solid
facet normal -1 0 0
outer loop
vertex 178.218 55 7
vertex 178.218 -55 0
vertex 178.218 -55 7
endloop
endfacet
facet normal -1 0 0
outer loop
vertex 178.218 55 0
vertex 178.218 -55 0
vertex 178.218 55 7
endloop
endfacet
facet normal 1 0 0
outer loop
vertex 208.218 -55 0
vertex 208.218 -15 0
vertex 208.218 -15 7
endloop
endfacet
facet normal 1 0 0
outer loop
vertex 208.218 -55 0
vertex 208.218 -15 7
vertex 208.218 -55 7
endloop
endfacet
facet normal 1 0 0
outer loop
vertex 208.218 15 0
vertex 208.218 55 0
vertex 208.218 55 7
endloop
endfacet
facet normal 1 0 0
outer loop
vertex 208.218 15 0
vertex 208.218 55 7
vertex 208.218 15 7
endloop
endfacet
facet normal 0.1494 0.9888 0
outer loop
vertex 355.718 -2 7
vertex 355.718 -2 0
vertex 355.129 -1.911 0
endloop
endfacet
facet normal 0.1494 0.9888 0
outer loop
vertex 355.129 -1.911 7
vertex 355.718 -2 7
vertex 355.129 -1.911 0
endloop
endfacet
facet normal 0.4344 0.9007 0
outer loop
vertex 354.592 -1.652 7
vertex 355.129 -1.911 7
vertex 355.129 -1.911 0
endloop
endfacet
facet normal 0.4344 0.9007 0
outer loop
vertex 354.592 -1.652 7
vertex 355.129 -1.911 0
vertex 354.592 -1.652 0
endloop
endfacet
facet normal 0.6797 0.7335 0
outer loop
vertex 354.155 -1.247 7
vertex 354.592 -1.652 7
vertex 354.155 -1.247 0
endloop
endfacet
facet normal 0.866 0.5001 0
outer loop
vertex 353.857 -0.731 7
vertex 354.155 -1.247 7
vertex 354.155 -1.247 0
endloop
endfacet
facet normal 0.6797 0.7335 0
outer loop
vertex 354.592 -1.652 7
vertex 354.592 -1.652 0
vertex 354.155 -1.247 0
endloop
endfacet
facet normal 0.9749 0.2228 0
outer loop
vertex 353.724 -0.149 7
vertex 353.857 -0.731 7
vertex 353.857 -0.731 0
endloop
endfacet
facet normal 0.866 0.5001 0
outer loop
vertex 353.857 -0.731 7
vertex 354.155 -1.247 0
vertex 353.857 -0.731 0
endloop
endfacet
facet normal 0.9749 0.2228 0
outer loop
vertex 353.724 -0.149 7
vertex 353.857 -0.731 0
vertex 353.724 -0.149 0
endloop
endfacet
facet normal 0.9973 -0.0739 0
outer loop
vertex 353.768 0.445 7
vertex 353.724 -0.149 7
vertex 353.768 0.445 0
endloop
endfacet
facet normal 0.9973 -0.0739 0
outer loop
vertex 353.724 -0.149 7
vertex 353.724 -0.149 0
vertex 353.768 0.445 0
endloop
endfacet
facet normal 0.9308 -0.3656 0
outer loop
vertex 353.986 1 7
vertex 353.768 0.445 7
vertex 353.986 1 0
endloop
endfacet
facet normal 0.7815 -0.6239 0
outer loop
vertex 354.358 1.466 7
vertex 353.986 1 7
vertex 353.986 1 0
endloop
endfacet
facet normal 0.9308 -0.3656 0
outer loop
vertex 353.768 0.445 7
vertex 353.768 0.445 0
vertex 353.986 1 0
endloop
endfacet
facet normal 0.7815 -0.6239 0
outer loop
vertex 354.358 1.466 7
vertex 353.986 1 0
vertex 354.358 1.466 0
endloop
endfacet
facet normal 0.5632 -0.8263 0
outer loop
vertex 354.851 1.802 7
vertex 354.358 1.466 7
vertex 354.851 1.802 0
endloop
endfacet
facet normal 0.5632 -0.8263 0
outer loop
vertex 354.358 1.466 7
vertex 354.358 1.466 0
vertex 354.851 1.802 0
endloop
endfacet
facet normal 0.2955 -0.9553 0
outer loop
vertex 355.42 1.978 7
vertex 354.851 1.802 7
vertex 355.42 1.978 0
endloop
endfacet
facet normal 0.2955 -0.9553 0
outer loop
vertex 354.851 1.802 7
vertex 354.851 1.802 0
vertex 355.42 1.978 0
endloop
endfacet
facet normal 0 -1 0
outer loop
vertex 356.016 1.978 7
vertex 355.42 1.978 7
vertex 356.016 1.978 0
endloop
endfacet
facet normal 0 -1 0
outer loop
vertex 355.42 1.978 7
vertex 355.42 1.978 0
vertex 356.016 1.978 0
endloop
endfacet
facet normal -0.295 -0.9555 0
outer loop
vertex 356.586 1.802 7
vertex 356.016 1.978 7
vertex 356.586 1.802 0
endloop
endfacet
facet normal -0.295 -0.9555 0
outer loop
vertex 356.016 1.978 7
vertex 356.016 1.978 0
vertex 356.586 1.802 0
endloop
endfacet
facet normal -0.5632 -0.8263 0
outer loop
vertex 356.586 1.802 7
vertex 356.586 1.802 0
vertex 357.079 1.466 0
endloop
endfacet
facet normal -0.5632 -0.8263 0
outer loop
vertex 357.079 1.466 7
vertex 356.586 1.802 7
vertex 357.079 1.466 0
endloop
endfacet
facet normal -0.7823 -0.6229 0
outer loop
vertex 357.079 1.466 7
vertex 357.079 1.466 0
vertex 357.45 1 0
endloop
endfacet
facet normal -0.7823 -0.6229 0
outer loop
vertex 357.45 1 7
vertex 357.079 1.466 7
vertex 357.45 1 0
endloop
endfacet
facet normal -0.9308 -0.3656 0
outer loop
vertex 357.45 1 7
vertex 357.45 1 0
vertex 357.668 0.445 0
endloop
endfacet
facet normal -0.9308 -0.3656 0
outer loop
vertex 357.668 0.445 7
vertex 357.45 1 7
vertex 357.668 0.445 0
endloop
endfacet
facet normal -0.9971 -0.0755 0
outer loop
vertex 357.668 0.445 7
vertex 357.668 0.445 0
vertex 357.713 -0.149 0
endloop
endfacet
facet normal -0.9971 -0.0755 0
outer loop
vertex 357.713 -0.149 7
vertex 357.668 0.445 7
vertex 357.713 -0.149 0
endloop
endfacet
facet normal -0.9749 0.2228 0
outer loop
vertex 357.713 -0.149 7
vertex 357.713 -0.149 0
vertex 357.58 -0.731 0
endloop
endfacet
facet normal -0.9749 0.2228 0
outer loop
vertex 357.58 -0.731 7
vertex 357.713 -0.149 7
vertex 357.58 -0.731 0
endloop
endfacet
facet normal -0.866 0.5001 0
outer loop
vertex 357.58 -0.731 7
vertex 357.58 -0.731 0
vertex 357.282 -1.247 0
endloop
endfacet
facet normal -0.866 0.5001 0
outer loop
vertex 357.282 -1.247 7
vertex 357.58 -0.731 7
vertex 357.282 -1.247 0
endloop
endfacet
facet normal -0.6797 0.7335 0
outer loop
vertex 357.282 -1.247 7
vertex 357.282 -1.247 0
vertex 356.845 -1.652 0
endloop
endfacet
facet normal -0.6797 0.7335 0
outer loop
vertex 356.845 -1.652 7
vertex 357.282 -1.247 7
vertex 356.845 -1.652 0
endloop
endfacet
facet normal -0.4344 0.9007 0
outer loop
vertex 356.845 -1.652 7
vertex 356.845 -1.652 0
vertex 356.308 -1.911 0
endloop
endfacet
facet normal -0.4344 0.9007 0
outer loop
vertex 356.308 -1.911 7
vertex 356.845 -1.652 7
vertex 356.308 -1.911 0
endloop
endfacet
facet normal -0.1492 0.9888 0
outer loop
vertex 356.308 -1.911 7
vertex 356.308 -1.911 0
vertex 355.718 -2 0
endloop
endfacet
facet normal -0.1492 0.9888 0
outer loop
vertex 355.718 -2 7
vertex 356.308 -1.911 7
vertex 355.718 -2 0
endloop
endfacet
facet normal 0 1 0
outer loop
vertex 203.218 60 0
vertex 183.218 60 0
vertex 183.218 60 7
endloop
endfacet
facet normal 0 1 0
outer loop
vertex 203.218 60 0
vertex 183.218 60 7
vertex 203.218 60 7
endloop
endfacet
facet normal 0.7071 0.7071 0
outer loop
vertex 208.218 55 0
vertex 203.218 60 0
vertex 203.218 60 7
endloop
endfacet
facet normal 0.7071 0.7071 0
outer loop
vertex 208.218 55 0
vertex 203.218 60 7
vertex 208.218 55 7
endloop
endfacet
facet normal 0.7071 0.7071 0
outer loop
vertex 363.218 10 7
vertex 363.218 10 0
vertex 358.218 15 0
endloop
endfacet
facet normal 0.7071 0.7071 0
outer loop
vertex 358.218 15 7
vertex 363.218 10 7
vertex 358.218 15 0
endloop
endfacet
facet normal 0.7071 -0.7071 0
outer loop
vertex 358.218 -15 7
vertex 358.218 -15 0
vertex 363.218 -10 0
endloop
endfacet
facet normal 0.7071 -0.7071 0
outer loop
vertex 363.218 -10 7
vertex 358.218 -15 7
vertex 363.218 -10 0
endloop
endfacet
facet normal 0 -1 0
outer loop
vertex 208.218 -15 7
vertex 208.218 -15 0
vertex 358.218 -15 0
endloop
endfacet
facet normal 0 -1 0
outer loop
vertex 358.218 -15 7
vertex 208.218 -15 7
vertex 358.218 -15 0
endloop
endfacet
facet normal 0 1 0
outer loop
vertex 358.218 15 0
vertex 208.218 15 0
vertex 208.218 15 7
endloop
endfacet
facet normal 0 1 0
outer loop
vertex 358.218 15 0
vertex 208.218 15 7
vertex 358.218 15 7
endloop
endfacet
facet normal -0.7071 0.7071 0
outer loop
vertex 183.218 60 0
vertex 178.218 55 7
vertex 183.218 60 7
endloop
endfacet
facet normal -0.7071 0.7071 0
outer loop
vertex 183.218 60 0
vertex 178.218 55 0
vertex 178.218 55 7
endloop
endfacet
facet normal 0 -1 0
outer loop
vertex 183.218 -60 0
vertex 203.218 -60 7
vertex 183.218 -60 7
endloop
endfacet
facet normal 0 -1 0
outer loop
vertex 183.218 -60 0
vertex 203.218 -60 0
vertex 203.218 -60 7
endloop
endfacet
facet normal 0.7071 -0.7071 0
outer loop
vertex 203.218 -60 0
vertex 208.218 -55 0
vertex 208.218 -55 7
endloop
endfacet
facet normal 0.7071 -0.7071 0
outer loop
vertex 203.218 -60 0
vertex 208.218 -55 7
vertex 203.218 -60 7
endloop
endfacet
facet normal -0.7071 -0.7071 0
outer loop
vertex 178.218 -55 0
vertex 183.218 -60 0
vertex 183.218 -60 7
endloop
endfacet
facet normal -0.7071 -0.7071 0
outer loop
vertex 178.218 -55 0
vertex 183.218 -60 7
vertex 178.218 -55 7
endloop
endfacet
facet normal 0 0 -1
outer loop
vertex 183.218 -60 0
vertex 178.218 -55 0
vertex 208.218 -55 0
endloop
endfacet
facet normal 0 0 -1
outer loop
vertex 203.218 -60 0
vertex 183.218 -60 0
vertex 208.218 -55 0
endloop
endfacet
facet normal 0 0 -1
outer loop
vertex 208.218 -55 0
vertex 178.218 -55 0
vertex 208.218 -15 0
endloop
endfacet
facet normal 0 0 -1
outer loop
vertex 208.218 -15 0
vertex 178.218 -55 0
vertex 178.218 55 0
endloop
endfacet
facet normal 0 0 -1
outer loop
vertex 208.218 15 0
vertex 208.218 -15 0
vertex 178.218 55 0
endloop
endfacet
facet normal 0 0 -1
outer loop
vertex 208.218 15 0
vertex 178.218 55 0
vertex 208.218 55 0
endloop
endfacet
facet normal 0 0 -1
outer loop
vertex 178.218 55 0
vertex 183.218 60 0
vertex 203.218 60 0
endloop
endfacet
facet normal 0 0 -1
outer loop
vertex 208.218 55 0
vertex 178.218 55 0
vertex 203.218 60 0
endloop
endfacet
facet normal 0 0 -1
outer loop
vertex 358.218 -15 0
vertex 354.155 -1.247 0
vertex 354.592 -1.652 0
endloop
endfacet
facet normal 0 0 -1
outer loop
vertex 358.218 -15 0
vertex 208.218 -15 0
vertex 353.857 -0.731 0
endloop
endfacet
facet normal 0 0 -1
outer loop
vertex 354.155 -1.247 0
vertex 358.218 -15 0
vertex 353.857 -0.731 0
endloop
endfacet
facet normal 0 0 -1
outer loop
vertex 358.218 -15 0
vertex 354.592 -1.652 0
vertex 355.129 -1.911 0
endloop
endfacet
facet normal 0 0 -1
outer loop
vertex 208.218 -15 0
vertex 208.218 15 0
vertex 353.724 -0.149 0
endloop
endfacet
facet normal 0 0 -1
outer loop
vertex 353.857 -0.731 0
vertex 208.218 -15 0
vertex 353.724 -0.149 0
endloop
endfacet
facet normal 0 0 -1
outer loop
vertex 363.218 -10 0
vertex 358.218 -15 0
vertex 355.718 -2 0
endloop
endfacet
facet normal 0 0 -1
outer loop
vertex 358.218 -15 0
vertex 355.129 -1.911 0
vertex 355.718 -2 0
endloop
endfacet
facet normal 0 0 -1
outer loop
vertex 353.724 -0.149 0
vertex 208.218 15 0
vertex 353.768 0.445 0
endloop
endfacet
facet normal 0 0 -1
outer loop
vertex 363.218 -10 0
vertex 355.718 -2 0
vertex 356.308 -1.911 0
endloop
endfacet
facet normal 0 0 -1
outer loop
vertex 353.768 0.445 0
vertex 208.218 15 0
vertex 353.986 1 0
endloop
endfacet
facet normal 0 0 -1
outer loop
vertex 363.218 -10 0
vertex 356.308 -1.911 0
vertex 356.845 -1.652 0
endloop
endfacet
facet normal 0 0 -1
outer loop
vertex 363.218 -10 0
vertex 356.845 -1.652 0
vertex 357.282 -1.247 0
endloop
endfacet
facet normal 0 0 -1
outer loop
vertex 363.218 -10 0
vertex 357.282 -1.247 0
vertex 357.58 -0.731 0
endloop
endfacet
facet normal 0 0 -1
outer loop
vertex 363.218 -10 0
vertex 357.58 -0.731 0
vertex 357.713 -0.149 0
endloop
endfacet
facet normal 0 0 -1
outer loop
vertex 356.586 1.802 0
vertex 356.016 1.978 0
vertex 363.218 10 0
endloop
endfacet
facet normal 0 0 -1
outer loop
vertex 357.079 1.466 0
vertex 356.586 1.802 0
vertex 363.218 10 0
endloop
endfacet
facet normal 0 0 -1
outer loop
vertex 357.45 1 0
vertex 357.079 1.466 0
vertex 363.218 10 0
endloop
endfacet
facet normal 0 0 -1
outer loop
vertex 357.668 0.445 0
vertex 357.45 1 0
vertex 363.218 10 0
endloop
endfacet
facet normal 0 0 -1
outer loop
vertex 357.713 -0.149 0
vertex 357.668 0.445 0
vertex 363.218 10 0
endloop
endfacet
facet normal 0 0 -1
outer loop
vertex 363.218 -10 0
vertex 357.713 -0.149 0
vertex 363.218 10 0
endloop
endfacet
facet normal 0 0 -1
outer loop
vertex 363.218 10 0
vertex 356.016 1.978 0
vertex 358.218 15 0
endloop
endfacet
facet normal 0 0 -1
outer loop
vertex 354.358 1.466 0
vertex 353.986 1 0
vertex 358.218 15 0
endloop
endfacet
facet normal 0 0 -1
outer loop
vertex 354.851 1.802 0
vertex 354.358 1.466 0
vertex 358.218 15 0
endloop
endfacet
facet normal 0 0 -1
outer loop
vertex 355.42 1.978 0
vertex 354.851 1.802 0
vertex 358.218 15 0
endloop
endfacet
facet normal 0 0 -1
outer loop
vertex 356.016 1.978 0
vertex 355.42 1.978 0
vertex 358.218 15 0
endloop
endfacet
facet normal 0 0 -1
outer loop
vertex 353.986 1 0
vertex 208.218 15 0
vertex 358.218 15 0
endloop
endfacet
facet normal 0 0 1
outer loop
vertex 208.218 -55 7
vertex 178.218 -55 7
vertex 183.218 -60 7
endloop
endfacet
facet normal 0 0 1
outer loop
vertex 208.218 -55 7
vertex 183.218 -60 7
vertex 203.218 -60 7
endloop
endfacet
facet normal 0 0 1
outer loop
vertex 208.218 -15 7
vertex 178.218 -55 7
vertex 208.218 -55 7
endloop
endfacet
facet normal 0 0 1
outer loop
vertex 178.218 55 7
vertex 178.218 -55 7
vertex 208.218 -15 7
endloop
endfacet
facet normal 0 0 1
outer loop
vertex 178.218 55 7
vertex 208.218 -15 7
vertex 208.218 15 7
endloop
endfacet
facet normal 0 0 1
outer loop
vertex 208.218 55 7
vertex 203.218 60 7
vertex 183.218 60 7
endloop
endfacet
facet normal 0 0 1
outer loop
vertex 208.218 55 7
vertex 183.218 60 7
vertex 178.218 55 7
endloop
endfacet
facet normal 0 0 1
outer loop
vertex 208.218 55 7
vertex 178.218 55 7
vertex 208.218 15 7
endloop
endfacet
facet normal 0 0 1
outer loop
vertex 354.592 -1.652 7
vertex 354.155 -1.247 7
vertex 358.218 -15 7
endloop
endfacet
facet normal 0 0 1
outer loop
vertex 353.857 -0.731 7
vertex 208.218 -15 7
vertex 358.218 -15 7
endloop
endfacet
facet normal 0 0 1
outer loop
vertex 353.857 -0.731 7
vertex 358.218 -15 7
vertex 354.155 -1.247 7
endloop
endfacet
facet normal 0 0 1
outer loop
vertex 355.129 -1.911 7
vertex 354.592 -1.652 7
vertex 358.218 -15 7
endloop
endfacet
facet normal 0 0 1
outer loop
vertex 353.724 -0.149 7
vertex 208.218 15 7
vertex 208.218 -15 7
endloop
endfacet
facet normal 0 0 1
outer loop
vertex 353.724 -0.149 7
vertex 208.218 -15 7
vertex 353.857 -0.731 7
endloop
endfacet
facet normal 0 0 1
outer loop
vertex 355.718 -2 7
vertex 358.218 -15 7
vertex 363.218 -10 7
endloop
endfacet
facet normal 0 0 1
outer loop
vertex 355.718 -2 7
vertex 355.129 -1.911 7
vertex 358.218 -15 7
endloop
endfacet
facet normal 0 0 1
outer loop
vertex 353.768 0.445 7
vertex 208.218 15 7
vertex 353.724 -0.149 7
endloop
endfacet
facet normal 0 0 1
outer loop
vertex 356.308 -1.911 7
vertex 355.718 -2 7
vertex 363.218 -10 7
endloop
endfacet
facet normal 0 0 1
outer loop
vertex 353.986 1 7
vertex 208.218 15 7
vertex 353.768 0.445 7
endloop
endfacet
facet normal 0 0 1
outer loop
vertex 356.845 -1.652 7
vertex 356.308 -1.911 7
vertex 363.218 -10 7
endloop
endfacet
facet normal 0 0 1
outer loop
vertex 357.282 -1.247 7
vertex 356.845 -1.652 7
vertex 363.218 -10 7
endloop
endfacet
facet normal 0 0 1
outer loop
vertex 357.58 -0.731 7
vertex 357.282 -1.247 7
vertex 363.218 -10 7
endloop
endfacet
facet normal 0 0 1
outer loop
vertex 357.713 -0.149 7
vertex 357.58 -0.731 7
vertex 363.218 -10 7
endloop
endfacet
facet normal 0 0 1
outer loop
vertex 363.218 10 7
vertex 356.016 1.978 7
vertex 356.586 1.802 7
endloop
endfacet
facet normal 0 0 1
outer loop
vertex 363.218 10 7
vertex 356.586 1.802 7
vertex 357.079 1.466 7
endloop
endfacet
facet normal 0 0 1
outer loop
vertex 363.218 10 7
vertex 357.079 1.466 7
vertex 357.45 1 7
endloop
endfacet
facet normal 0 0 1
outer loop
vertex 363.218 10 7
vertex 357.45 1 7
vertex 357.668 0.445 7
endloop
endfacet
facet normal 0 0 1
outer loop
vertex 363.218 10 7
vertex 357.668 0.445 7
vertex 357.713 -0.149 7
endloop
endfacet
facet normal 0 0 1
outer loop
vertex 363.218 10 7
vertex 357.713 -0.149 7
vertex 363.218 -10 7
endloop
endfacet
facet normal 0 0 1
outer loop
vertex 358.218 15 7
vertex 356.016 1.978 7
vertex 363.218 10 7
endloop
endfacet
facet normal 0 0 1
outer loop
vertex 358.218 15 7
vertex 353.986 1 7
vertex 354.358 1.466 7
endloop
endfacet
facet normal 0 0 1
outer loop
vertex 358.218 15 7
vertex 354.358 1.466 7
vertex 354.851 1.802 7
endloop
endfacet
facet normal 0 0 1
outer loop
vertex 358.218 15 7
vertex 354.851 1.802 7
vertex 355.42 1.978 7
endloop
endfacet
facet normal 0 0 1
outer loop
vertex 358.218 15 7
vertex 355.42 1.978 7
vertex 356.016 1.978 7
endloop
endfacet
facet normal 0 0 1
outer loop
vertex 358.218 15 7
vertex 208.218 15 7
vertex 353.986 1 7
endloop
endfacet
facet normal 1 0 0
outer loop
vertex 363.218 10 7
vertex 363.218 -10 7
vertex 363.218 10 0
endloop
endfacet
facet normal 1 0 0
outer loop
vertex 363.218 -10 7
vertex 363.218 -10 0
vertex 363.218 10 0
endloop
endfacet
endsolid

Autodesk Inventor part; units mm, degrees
ref_plane "YZ Plane" through (0, 0, 0) normal (1, 0, 0) x (0, 1, 0)
ref_plane "XZ Plane" through (0, 0, 0) normal (0, 1, 0) x (-1, 0, 0)
ref_plane "XY Plane" through (0, 0, 0) normal (0, 0, 1) x (1, 0, 0)
sketch "Sketch1" plane through (0, 0, 0) normal (0, 0, 1) x (1, 0, 0)
  line L0 (100, -75) -> (100, -15) projected
  line L1 (100, 75) -> (-100, 75) projected
  line L2 (-100, 75) -> (-100, -75) projected
  line L3 (-100, -75) -> (100, -75) projected
  arc A0 (-85, -15) -> (-85, 15) centre (-85, 0) ccw projected
  line L4 (-85, 15) -> (-85, 60) projected
  line L5 (-85, 60) -> (85, 60) projected
  line L6 (85, -15) -> (85, -60) projected
  line L7 (85, -60) -> (-85, -60) projected
  line L8 (-85, -60) -> (-85, -15) projected
  line L9 (183.2183, 60) -> (203.2183, 60)
  line L10 (203.2183, -60) -> (183.2183, -60)
  line L11 (178.2183, -55) -> (178.2183, 55)
  line L12 (208.2183, 0) -> (358.2183, 0) construction
  line L13 (208.2183, 15) -> (358.2183, 15)
  line L14 (208.2183, -15) -> (358.2183, -15)
  line L15 (363.2183, -10) -> (363.2183, 10)
  line L16 (208.2183, 55) -> (208.2183, 15)
  line L17 (208.2183, -15) -> (208.2183, -55)
  line L18 (85, 60) -> (85, 15) projected
  line L19 (85, 15) -> (100, 15) projected
  line L20 (100, 15) -> (100, 75) projected
  line L21 (100, -15) -> (85, -15) projected
  line L22 (358.2183, -15) -> (363.2183, -10)
  line L23 (363.2183, 10) -> (358.2183, 15)
  line L24 (178.2183, 55) -> (183.2183, 60)
  line L25 (203.2183, 60) -> (208.2183, 55)
  line L26 (208.2183, -55) -> (203.2183, -60)
  line L27 (183.2183, -60) -> (178.2183, -55)
  point P0 (0, 0)
  point P1 (178.2183, 60)
  point P2 (208.2183, -60)
  point P3 (208.2183, 60)
  point P4 (178.2183, -60)
  point P5 (363.2183, 15)
  point P6 (363.2183, -15)
  point P7 (1.2343, 60)
  point P8 (-28.7657, -60)
  point P9 (-3.7657, -60)
  point P10 (-23.7657, -60)
  point P11 (-23.7657, 60)
  point P12 (-3.7657, 60)
  dimension "d0" = 30
  dimension "d1" = 150
  dimension "d2" = 15
  dimension "d3" = 15
  dimension "d6" = 185
  dimension "d7" = 30
  dimension "d8" = 45
  dimension "d9" = 5
  dimension "d10" = 5
  dimension "d11" = 5
  dimension "d12" = 5
  dimension "d13" = 5
  dimension "d14" = 5
  dimension "d15" = 5
  dimension "d16" = 5
  dimension "d17" = 5
  dimension "d18" = 5
  dimension "d19" = 5
  dimension "d20" = 5
extrude "Extrusion1" add sketch "Sketch1" along normal blind 7 contours L9 L25 L16 L13 L23 L15 L22 L14 L17 L26 L10 L27 L11 L24
sketch "Sketch2" plane through (0, 0, 7) normal (0, 0, 1) x (1, 0, 0)
  line L0 (363.2183, -10) -> (363.2183, 10) projected
  point P0 (0, 0)
  point P1 (355.7183, 0)
  dimension "d21" = 7.5
hole "Hole1" at (355.7183, 0, 7) direction (0, 0, -1) diameter 4 end through all
equation "\"d1\" = lPiston"
equation "\"d10\" = d9"
equation "\"d11\" = d9"
equation "\"d12\" = d11"
equation "\"d13\" = d9"
equation "\"d14\" = d13"
equation "\"d15\" = d9"
equation "\"d16\" = d15"
equation "\"d17\" = d9"
equation "\"d18\" = d17"
equation "\"d19\" = d9"
equation "\"d20\" = d19"
equation "\"lPiston\" = 150"
properties part number "Piston" material "MDF Medium Density Fiberboard"
